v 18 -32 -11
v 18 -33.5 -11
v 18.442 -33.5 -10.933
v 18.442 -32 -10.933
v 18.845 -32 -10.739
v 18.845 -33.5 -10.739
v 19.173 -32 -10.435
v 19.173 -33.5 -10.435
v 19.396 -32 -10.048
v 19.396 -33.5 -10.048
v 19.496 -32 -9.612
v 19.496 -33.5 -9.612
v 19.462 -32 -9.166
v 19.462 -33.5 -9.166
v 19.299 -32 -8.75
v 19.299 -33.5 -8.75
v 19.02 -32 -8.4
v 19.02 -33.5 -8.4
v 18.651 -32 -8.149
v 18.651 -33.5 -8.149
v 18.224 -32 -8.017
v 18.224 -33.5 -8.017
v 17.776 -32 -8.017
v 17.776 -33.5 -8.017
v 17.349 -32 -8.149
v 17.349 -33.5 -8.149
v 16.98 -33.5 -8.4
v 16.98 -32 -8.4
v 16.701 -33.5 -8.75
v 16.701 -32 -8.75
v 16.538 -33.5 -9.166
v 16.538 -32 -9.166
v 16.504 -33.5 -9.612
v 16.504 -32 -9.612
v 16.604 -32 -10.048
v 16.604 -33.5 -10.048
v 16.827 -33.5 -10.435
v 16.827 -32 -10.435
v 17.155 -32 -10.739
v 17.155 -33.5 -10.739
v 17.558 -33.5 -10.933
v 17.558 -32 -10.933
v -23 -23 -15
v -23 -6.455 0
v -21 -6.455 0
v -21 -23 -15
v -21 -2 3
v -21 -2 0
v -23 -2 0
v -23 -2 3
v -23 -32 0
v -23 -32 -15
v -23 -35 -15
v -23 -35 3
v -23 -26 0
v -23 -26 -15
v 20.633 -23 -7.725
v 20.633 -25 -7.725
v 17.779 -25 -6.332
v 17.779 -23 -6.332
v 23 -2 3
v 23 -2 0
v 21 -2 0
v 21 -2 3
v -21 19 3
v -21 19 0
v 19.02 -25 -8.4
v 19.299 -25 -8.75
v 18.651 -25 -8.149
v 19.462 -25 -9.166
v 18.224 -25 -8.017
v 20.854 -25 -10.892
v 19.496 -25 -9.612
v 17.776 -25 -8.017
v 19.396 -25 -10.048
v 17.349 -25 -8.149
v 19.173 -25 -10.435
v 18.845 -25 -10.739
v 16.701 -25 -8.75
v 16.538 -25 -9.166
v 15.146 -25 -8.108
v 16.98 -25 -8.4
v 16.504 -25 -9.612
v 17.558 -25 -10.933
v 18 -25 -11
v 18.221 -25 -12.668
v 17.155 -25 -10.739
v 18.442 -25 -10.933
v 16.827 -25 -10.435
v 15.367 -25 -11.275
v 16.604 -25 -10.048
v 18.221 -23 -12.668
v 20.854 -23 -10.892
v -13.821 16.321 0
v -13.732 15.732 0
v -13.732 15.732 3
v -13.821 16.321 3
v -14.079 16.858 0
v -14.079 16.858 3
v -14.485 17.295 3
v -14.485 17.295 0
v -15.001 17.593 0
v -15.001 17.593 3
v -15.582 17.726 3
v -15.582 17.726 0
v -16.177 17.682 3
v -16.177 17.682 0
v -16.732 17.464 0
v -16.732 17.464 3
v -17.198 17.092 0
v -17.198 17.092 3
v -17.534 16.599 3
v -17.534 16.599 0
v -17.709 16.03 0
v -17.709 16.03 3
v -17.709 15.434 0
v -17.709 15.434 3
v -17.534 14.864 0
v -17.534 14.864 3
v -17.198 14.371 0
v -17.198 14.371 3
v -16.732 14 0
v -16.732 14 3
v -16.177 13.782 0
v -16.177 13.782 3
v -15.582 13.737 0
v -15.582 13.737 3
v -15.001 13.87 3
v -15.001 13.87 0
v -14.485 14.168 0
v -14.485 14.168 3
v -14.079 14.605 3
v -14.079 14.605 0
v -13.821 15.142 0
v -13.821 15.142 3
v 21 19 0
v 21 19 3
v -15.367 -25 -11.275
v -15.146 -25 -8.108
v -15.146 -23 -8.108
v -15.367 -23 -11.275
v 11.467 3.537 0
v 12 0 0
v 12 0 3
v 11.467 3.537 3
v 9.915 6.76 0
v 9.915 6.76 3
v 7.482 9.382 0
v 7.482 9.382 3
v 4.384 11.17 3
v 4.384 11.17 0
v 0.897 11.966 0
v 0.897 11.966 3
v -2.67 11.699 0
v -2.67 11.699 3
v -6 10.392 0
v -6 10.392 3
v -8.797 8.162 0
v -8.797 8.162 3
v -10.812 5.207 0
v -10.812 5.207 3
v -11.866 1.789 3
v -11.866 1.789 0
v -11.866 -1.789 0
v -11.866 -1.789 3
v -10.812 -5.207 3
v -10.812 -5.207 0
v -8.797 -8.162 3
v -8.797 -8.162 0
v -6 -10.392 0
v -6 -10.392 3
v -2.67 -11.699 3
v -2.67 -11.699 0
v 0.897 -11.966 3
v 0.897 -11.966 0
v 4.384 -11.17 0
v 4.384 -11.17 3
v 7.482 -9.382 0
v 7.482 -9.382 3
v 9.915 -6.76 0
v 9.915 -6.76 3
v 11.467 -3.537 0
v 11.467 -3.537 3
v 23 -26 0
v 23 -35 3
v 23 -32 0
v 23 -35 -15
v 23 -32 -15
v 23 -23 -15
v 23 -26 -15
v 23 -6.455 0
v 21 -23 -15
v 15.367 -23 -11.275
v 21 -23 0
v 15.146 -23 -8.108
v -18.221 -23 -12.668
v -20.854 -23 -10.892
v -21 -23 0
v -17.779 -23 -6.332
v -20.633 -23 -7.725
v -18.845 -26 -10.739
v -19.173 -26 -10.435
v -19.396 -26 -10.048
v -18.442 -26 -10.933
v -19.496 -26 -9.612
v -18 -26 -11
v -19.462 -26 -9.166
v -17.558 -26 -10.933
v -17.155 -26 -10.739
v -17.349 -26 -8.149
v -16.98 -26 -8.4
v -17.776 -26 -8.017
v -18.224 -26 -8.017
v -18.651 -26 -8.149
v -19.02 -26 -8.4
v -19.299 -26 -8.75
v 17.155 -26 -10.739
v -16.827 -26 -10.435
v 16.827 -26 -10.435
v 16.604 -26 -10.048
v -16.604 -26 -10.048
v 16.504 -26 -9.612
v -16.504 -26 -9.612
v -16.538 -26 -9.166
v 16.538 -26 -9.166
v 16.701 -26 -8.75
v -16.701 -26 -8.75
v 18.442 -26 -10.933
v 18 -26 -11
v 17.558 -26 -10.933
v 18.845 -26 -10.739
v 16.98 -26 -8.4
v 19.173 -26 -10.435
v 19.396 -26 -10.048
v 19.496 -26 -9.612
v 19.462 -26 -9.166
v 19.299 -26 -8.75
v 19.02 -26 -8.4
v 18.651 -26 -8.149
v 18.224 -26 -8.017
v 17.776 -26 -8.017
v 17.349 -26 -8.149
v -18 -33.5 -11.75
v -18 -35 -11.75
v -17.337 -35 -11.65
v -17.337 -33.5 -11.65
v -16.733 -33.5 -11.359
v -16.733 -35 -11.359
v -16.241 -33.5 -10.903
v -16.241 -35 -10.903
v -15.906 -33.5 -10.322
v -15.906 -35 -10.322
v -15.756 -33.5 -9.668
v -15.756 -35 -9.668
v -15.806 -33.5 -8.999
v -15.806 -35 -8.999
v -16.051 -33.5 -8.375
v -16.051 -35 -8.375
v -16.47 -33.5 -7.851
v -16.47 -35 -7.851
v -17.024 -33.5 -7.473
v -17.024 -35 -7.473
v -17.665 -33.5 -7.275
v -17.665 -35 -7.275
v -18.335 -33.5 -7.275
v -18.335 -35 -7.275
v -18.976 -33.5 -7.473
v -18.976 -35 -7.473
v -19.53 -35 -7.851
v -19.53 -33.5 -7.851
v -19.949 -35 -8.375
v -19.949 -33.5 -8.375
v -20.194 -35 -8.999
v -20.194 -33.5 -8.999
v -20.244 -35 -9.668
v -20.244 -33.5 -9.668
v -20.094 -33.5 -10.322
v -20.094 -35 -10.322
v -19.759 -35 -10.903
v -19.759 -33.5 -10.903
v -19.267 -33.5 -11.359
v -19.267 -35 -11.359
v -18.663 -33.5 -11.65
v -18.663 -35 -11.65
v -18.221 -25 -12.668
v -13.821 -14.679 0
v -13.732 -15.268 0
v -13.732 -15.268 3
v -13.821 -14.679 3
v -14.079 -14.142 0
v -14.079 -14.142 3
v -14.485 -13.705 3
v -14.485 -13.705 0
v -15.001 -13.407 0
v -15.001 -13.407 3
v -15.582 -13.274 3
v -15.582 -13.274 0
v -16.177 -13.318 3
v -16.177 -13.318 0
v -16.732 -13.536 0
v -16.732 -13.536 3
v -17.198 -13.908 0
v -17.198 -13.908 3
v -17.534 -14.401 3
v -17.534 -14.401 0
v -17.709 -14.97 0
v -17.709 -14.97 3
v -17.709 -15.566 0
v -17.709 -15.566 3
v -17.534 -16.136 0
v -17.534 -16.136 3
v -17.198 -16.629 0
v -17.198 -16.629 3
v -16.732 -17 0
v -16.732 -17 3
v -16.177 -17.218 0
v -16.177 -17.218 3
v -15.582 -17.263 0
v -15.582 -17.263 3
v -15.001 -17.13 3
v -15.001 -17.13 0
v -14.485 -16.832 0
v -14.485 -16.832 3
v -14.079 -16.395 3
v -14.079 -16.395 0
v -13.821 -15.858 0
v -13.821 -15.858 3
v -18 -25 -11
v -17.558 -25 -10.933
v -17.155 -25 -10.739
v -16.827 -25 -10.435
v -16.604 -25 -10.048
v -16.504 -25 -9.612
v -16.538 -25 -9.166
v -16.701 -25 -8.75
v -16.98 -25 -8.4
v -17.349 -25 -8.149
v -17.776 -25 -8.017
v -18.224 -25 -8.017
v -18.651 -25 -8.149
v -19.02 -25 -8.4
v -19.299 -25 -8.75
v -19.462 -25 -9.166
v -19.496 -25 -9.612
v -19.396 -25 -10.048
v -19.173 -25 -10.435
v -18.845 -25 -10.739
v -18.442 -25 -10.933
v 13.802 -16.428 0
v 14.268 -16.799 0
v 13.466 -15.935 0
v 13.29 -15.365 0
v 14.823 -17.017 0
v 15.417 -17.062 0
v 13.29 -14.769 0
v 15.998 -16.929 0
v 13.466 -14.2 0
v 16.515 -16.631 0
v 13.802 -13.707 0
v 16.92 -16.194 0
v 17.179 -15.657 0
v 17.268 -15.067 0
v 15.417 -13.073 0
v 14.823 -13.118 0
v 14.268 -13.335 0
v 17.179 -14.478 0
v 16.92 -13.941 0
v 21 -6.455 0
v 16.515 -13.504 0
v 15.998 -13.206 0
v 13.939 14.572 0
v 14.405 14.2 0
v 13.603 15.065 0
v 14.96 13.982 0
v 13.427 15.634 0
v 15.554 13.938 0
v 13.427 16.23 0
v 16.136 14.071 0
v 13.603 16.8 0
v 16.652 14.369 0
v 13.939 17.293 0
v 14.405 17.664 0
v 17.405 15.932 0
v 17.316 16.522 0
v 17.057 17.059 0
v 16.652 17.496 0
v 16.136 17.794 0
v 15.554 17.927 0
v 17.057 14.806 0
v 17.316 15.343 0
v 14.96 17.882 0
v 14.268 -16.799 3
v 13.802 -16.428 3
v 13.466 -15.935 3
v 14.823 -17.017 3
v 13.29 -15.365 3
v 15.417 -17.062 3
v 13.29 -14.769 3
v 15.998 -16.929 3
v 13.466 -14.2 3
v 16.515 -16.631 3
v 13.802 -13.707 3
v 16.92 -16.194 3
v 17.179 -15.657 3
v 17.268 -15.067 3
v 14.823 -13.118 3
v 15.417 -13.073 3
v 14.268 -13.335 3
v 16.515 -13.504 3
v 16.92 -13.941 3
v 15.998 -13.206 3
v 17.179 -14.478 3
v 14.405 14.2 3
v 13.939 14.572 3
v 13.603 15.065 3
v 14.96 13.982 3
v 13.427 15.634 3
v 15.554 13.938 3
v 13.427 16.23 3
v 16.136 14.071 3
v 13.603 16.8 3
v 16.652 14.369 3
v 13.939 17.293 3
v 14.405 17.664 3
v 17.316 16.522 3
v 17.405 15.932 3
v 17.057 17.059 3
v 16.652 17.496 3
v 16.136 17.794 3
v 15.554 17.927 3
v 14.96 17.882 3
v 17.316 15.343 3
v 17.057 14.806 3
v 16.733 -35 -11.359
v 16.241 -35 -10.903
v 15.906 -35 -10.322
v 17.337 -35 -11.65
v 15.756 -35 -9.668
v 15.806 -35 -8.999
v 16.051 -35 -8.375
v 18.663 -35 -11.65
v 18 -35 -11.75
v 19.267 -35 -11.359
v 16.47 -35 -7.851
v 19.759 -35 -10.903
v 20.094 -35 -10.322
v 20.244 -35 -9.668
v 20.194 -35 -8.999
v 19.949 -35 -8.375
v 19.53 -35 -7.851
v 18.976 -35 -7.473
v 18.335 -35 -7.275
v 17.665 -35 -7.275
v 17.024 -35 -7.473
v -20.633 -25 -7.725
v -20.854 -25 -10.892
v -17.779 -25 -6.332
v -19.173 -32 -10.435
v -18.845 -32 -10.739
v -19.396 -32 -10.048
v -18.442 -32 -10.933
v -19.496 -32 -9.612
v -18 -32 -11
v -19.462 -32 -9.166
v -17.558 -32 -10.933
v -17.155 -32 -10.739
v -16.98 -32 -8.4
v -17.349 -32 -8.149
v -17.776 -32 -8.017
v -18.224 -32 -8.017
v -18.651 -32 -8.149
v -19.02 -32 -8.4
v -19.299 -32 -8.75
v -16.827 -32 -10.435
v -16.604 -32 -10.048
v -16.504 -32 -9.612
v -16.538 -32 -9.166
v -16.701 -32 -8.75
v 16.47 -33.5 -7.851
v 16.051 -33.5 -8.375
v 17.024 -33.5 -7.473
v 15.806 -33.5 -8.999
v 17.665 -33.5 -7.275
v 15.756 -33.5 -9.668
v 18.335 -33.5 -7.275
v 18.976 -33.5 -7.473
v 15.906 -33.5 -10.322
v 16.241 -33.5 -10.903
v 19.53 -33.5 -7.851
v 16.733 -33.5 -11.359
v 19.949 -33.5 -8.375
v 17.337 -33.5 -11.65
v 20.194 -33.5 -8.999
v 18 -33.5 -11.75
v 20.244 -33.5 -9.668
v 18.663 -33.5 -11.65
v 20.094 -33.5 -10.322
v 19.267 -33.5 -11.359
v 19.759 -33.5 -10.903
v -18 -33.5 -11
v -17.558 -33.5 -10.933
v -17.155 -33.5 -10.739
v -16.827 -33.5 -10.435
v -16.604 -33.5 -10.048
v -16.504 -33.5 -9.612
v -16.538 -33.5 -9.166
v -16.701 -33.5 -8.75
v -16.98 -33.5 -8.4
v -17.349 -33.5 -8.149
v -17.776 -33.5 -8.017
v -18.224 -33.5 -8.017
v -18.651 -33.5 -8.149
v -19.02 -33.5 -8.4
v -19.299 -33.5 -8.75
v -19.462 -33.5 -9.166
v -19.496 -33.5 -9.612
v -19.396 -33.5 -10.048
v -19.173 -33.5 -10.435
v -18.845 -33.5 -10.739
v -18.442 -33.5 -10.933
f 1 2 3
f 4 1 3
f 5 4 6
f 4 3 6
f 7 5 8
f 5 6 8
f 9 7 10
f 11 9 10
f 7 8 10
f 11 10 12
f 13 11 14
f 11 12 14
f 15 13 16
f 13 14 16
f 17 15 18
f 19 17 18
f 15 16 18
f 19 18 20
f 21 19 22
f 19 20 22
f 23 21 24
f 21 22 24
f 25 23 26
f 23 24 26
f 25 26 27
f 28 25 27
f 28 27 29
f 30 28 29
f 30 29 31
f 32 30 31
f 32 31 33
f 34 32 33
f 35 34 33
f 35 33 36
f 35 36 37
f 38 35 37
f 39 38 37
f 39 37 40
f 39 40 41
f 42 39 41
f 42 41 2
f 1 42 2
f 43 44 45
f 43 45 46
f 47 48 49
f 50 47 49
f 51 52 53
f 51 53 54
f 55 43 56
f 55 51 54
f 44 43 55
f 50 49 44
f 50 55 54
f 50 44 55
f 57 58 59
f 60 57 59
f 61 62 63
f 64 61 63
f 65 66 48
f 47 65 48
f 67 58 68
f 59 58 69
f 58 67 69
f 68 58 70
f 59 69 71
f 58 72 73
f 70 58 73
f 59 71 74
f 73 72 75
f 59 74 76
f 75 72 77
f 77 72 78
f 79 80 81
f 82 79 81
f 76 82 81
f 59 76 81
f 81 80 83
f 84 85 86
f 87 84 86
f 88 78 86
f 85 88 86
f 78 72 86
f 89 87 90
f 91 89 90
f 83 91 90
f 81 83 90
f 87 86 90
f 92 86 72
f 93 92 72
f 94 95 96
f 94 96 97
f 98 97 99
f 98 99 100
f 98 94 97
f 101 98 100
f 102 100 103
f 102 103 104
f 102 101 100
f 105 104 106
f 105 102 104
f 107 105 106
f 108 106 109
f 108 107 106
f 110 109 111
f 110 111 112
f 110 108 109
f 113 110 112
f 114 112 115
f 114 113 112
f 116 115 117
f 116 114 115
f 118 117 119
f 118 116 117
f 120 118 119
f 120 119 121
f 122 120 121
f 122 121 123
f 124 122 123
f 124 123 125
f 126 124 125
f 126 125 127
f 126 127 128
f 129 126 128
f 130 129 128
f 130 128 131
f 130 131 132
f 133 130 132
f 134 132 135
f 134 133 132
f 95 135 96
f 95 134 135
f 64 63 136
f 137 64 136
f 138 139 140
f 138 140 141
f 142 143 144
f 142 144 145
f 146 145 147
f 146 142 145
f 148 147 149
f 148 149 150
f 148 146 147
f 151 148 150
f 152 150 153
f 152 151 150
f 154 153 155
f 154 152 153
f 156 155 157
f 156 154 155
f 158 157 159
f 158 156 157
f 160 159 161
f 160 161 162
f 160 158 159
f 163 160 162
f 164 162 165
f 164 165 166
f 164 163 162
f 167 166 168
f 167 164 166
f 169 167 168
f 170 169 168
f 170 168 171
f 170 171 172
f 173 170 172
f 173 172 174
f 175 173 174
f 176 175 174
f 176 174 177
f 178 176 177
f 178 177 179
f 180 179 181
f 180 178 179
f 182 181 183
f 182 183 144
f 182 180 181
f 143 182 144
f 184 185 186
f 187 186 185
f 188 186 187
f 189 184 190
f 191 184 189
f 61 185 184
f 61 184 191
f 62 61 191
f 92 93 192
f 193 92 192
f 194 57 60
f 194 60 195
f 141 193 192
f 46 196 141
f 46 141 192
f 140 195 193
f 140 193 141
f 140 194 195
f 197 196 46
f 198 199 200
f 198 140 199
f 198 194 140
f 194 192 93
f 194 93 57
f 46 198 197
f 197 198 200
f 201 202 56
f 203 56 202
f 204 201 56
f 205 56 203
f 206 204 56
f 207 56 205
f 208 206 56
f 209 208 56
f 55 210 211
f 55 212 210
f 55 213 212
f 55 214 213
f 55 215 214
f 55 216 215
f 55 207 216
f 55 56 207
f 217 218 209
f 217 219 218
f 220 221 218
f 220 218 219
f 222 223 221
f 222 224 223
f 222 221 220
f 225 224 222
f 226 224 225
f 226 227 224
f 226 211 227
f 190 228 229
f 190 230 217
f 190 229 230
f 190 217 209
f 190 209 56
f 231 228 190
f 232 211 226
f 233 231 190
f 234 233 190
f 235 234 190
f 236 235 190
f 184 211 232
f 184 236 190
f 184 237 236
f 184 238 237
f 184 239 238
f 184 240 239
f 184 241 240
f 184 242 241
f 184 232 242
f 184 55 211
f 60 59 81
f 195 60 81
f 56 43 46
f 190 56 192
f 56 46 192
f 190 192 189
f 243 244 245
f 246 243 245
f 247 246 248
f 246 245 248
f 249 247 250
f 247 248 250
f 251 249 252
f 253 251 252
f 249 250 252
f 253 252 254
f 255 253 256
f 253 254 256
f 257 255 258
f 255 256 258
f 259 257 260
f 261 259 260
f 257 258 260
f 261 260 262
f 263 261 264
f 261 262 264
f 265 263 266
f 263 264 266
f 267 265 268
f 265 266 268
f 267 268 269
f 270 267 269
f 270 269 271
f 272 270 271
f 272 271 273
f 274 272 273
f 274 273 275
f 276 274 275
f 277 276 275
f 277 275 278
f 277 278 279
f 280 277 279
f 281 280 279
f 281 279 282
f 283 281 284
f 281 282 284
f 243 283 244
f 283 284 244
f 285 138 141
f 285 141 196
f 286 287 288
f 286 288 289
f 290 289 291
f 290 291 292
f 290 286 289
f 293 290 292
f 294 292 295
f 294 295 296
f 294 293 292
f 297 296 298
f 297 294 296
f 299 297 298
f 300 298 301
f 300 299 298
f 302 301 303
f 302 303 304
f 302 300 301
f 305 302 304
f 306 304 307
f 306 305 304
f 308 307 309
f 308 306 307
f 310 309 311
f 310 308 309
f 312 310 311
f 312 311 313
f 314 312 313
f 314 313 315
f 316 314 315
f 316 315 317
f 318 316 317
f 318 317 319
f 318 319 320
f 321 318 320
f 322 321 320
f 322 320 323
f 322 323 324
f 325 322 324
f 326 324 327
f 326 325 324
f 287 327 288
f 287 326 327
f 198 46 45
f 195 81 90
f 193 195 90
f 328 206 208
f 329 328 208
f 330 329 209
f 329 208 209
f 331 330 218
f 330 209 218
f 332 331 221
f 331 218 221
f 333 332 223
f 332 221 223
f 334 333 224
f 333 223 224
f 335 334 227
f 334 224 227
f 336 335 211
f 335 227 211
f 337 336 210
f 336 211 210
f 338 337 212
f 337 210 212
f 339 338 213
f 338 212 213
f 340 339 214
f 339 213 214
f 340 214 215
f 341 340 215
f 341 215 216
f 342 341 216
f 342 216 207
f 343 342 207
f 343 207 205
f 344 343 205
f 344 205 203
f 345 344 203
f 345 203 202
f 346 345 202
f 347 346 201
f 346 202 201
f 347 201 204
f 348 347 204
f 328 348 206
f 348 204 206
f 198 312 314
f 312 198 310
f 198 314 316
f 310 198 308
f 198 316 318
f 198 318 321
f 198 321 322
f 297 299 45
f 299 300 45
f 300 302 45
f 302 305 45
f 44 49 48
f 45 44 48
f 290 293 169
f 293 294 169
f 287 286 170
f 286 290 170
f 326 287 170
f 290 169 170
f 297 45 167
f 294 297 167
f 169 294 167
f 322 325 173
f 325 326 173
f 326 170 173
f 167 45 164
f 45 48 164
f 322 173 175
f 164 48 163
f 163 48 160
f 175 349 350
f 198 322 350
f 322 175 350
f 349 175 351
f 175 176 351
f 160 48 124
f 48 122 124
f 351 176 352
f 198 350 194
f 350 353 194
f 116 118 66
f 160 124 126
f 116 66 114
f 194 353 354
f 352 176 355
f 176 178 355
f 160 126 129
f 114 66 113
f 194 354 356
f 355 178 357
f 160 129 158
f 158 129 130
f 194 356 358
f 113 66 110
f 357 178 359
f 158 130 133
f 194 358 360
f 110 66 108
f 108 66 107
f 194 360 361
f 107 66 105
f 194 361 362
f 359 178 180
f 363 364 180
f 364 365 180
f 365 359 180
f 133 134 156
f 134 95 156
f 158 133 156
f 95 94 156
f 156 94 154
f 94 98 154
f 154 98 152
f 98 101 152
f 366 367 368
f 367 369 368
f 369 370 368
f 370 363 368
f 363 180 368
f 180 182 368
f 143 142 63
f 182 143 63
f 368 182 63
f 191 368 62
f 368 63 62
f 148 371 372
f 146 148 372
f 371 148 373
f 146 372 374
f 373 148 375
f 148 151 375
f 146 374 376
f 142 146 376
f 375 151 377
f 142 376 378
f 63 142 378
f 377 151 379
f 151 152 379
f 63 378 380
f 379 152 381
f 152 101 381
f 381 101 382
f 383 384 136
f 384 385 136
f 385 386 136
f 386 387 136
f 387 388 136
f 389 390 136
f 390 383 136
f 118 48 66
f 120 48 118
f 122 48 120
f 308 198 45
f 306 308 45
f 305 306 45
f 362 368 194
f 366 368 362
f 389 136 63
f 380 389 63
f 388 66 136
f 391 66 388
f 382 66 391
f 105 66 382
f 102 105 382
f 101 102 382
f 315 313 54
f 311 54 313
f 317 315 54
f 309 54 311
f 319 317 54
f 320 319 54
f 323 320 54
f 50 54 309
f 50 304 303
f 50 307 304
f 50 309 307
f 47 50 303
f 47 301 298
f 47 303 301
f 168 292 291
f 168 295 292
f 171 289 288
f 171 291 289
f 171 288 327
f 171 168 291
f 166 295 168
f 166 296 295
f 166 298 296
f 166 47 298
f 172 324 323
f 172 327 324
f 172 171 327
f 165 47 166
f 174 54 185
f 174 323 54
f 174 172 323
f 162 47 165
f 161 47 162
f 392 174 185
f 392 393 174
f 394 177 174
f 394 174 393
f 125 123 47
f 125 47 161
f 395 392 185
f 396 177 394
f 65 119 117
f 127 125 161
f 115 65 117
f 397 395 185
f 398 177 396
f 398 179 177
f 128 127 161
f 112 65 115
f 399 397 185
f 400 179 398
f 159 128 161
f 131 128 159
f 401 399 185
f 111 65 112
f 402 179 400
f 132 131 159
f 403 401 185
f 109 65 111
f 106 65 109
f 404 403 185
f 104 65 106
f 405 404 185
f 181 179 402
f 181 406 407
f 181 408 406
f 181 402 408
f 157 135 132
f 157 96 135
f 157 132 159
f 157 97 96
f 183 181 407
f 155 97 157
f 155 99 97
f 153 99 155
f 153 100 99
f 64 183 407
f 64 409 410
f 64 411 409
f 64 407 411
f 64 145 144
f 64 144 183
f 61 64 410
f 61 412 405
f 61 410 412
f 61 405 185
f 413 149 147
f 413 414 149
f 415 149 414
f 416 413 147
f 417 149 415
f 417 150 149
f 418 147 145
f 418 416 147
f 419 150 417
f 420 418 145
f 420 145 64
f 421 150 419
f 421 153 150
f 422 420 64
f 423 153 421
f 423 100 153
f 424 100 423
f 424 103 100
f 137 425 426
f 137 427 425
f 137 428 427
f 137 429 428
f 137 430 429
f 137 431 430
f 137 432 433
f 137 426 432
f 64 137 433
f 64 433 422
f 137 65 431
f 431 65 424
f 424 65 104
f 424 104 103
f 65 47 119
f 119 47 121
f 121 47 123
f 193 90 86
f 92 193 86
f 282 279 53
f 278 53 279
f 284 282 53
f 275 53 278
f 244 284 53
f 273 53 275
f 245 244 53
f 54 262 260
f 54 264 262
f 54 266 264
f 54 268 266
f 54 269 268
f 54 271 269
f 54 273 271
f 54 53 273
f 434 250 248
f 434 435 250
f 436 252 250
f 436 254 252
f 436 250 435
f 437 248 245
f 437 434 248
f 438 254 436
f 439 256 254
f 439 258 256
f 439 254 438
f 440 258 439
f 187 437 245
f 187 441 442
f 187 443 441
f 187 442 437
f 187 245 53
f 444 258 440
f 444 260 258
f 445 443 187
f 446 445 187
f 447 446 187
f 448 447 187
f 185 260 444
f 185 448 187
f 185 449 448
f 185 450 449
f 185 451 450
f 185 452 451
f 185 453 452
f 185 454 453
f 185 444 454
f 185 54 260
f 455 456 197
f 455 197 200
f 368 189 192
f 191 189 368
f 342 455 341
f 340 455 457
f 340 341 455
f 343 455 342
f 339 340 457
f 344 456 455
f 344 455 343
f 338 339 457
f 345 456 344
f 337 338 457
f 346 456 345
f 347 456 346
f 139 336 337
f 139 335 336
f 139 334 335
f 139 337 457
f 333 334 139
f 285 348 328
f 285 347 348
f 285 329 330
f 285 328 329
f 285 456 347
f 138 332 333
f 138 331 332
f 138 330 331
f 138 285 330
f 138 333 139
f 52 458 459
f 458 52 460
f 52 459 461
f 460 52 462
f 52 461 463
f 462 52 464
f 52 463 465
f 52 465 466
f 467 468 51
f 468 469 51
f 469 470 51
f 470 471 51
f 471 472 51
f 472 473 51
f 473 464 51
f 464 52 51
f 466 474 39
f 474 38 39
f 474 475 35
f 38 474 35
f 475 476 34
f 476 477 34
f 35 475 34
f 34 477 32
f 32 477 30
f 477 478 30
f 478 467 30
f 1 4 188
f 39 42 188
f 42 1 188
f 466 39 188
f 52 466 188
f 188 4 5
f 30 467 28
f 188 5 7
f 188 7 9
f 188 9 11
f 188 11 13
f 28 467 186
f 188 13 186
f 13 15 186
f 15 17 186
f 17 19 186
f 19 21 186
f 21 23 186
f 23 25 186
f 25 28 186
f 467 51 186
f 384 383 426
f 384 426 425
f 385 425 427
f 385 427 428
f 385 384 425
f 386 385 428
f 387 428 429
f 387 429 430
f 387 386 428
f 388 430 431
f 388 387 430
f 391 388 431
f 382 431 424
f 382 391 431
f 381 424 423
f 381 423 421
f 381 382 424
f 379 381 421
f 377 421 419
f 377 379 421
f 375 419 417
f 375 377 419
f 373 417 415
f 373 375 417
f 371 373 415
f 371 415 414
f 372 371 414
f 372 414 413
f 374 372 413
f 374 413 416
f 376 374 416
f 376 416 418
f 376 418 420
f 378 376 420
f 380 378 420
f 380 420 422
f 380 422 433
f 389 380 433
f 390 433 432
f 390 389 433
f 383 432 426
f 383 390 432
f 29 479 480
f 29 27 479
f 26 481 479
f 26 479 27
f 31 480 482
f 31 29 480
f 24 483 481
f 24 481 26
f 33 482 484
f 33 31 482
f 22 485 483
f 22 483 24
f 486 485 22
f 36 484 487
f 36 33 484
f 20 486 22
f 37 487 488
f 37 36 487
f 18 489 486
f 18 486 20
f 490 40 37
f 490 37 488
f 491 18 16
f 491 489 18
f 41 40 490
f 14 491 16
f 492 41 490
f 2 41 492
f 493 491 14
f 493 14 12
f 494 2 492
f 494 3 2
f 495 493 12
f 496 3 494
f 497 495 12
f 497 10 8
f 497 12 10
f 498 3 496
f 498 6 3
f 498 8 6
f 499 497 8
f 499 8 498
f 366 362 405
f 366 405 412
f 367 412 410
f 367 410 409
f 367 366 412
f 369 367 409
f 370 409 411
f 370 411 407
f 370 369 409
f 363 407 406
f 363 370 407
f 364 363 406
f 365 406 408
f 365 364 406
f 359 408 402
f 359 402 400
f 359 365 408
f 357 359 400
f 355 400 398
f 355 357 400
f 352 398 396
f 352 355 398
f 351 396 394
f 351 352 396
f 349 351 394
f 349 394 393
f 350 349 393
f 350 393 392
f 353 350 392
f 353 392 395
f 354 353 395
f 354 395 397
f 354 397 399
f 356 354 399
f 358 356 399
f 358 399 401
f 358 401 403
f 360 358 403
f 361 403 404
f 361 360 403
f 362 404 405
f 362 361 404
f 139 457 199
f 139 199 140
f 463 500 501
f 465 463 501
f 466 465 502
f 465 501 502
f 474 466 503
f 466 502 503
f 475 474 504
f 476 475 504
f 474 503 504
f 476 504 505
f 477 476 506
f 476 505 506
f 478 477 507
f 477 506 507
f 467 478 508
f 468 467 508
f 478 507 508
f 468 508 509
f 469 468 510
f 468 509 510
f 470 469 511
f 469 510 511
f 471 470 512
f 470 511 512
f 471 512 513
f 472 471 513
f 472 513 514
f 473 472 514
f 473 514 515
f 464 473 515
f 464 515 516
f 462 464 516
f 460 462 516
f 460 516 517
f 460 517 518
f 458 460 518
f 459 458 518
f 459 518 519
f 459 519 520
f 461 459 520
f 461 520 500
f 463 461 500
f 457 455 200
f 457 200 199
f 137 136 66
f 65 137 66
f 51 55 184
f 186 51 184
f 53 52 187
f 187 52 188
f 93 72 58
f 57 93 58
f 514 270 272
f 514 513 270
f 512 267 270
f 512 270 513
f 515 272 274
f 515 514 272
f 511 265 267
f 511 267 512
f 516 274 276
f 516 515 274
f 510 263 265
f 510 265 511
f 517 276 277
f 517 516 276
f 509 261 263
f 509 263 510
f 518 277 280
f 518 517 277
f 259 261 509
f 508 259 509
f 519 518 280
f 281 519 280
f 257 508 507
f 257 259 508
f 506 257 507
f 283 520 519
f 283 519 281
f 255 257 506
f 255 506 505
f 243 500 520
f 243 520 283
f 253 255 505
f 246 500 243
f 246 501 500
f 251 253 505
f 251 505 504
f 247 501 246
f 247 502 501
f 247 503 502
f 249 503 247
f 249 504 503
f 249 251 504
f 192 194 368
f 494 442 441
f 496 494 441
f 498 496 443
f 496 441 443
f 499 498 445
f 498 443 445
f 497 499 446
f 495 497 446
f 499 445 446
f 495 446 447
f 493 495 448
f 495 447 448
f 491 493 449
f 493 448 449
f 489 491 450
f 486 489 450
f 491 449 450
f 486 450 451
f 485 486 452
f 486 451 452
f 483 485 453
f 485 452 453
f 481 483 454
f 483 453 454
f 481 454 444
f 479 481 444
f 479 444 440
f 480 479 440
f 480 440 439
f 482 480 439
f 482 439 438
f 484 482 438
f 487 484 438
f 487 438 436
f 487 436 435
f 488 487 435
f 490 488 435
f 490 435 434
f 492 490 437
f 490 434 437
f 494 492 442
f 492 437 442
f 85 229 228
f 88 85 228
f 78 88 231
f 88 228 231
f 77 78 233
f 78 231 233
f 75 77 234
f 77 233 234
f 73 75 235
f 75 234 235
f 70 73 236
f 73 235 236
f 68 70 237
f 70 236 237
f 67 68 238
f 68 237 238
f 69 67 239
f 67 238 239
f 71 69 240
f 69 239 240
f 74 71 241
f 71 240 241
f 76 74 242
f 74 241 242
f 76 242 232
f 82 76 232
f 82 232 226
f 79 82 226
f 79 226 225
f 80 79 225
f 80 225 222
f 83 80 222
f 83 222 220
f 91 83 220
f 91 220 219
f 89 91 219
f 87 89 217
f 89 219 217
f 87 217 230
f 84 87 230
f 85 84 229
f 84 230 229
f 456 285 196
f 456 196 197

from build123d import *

# Parameters (mm, degrees)
ESBO_O1_R                = 2
ESBO_O1_R_2              = 12
ESBO_O1_W                = 46
ESBO_O1_H                = 6
ESBO_O1_H_2              = 3
RESSALTO_EXTRUS_O1_DEPTH = 3
ESBO_O1_3_W              = 46
ESBO_O1_3_H              = 3
RESSALTO_EXTRUS_O2_DEPTH = 15
ESBO_O2_R                = 2.25
ESBO_O2_R_2              = 1.5
CORTE_EXTRUS_O1_DEPTH    = 1.5
ESBO_O2_4_R              = 1.5
CORTE_EXTRUS_O3_DEPTH    = 61.580524923
RESSALTO_EXTRUS_O3_DEPTH = 2
RESSALTO_EXTRUS_O4_DEPTH = 2
CORTE_EXTRUS_O4_START    = -2
ESBO_O7_R                = 1.5
CORTE_EXTRUS_O4_DEPTH    = 2


with BuildPart() as part:
    # Esboço1 → Ressalto-extrusão1 (new body)
    # profile 1 of 4: a face of its own
    with BuildSketch(Plane.XY):
        Polygon((-23, -2), (-23, -23), (23, -23), (23, -2), (21, -2), (21, 19), (-21, 19), (-21, -2), align=None)
        with Locations((-15.731654435, -15.268345565)):
            Circle(ESBO_O1_R, mode=Mode.SUBTRACT)
        with Locations((15.26769418, -15.067384206)):
            Circle(ESBO_O1_R, mode=Mode.SUBTRACT)
        with Locations((-15.731654435, 15.731654435)):
            Circle(ESBO_O1_R, mode=Mode.SUBTRACT)
        Circle(ESBO_O1_R_2, mode=Mode.SUBTRACT)
        with Locations((15.404994987, 15.932311736)):
            Circle(ESBO_O1_R, mode=Mode.SUBTRACT)
    # profile 2 of 4: a face of its own
    with BuildSketch(Plane.XY):
        Polygon((23, -23), (-23, -23), (-23, -25), (-23, -26), (23, -26), (23, -25), align=None)
    # profile 3 of 4: a face of its own
    with BuildSketch(Plane.XY):
        with Locations((0, -29)):
            Rectangle(ESBO_O1_W, ESBO_O1_H)
    # profile 4 of 4: a face of its own
    with BuildSketch(Plane.XY):
        with Locations((0, -33.5)):
            Rectangle(ESBO_O1_W, ESBO_O1_H_2)
    extrude(amount=RESSALTO_EXTRUS_O1_DEPTH)

    # Esboço1<3> → Ressalto-extrusão2 (add)
    with BuildSketch(Plane.XY):
        Polygon((23, -23), (-23, -23), (-23, -25), (-23, -26), (23, -26), (23, -25), align=None)
        with Locations((0, -33.5)):
            Rectangle(ESBO_O1_3_W, ESBO_O1_3_H)
    extrude(amount=-RESSALTO_EXTRUS_O2_DEPTH)

    # Esboço2 → Corte-extrusão1 (cut)
    # profile 1 of 2: a face of its own
    with BuildSketch(Plane.XZ.offset(35)):
        with Locations(Location((-18, -9.5, 0), (0, 0, 270))):
            Circle(ESBO_O2_R)
        with Locations(Location((-18, -9.5, 0), (0, 0, 270))):
            Circle(ESBO_O2_R_2, mode=Mode.SUBTRACT)
    # profile 2 of 2: a face of its own
    with BuildSketch(Plane.XZ.offset(35)):
        with Locations(Location((18, -9.5, 0), (0, 0, 270))):
            Circle(ESBO_O2_R)
        with Locations(Location((18, -9.5, 0), (0, 0, 270))):
            Circle(ESBO_O2_R_2, mode=Mode.SUBTRACT)
    extrude(amount=-CORTE_EXTRUS_O1_DEPTH, mode=Mode.SUBTRACT)

    # Esboço2<4> → Corte-extrusão3 (cut, through all)
    with BuildSketch(Plane.XZ.offset(35)):
        with Locations(Location((-18, -9.5, 0), (0, 0, 270))):
            Circle(ESBO_O2_4_R)
        with Locations(Location((18, -9.5, 0), (0, 0, 270))):
            Circle(ESBO_O2_4_R)
    extrude(amount=-CORTE_EXTRUS_O3_DEPTH, mode=Mode.SUBTRACT)

    # Esboço5 → Ressalto-extrusão3 (add)
    with BuildSketch(Plane(origin=(23, 0, 0), x_dir=(0, 0, -1), z_dir=(1, 0, 0))):
        Polygon((15, -23), (0, -6.455375179), (0, -23), align=None)
    extrude(amount=-RESSALTO_EXTRUS_O3_DEPTH)

    # Esboço6 → Ressalto-extrusão4 (add)
    with BuildSketch(Plane.ZY.offset(23)):
        Polygon((-15, -23), (0, -23), (0, -6.455375179), align=None)
    extrude(amount=-RESSALTO_EXTRUS_O4_DEPTH)

    # Esboço7 → Corte-extrusão4 (cut)
    # profile 1 of 2: a face of its own
    with BuildSketch(Plane(origin=(0, -23, 0), x_dir=(1, 0, 0), z_dir=(0, 1, 0)).offset(CORTE_EXTRUS_O4_START)):
        Polygon((-20.632829264, 7.724741314), (-17.778995512, 6.332273631), (-15.146166248, 8.107532317), (-15.367170736, 11.275258686), (-18.221004488, 12.667726369), (-20.853833752, 10.892467683), align=None)
        with Locations((-18, 9.5)):
            Circle(ESBO_O7_R, mode=Mode.SUBTRACT)
    # profile 2 of 2: a face of its own
    with BuildSketch(Plane(origin=(0, -23, 0), x_dir=(1, 0, 0), z_dir=(0, 1, 0)).offset(CORTE_EXTRUS_O4_START)):
        Polygon((17.778995512, 6.332273631), (15.146166248, 8.107532317), (15.367170736, 11.275258686), (18.221004488, 12.667726369), (20.853833752, 10.892467683), (20.632829264, 7.724741314), align=None)
        with Locations((18, 9.5)):
            Circle(ESBO_O7_R, mode=Mode.SUBTRACT)
    extrude(amount=CORTE_EXTRUS_O4_DEPTH, mode=Mode.SUBTRACT)


solid = part.part
